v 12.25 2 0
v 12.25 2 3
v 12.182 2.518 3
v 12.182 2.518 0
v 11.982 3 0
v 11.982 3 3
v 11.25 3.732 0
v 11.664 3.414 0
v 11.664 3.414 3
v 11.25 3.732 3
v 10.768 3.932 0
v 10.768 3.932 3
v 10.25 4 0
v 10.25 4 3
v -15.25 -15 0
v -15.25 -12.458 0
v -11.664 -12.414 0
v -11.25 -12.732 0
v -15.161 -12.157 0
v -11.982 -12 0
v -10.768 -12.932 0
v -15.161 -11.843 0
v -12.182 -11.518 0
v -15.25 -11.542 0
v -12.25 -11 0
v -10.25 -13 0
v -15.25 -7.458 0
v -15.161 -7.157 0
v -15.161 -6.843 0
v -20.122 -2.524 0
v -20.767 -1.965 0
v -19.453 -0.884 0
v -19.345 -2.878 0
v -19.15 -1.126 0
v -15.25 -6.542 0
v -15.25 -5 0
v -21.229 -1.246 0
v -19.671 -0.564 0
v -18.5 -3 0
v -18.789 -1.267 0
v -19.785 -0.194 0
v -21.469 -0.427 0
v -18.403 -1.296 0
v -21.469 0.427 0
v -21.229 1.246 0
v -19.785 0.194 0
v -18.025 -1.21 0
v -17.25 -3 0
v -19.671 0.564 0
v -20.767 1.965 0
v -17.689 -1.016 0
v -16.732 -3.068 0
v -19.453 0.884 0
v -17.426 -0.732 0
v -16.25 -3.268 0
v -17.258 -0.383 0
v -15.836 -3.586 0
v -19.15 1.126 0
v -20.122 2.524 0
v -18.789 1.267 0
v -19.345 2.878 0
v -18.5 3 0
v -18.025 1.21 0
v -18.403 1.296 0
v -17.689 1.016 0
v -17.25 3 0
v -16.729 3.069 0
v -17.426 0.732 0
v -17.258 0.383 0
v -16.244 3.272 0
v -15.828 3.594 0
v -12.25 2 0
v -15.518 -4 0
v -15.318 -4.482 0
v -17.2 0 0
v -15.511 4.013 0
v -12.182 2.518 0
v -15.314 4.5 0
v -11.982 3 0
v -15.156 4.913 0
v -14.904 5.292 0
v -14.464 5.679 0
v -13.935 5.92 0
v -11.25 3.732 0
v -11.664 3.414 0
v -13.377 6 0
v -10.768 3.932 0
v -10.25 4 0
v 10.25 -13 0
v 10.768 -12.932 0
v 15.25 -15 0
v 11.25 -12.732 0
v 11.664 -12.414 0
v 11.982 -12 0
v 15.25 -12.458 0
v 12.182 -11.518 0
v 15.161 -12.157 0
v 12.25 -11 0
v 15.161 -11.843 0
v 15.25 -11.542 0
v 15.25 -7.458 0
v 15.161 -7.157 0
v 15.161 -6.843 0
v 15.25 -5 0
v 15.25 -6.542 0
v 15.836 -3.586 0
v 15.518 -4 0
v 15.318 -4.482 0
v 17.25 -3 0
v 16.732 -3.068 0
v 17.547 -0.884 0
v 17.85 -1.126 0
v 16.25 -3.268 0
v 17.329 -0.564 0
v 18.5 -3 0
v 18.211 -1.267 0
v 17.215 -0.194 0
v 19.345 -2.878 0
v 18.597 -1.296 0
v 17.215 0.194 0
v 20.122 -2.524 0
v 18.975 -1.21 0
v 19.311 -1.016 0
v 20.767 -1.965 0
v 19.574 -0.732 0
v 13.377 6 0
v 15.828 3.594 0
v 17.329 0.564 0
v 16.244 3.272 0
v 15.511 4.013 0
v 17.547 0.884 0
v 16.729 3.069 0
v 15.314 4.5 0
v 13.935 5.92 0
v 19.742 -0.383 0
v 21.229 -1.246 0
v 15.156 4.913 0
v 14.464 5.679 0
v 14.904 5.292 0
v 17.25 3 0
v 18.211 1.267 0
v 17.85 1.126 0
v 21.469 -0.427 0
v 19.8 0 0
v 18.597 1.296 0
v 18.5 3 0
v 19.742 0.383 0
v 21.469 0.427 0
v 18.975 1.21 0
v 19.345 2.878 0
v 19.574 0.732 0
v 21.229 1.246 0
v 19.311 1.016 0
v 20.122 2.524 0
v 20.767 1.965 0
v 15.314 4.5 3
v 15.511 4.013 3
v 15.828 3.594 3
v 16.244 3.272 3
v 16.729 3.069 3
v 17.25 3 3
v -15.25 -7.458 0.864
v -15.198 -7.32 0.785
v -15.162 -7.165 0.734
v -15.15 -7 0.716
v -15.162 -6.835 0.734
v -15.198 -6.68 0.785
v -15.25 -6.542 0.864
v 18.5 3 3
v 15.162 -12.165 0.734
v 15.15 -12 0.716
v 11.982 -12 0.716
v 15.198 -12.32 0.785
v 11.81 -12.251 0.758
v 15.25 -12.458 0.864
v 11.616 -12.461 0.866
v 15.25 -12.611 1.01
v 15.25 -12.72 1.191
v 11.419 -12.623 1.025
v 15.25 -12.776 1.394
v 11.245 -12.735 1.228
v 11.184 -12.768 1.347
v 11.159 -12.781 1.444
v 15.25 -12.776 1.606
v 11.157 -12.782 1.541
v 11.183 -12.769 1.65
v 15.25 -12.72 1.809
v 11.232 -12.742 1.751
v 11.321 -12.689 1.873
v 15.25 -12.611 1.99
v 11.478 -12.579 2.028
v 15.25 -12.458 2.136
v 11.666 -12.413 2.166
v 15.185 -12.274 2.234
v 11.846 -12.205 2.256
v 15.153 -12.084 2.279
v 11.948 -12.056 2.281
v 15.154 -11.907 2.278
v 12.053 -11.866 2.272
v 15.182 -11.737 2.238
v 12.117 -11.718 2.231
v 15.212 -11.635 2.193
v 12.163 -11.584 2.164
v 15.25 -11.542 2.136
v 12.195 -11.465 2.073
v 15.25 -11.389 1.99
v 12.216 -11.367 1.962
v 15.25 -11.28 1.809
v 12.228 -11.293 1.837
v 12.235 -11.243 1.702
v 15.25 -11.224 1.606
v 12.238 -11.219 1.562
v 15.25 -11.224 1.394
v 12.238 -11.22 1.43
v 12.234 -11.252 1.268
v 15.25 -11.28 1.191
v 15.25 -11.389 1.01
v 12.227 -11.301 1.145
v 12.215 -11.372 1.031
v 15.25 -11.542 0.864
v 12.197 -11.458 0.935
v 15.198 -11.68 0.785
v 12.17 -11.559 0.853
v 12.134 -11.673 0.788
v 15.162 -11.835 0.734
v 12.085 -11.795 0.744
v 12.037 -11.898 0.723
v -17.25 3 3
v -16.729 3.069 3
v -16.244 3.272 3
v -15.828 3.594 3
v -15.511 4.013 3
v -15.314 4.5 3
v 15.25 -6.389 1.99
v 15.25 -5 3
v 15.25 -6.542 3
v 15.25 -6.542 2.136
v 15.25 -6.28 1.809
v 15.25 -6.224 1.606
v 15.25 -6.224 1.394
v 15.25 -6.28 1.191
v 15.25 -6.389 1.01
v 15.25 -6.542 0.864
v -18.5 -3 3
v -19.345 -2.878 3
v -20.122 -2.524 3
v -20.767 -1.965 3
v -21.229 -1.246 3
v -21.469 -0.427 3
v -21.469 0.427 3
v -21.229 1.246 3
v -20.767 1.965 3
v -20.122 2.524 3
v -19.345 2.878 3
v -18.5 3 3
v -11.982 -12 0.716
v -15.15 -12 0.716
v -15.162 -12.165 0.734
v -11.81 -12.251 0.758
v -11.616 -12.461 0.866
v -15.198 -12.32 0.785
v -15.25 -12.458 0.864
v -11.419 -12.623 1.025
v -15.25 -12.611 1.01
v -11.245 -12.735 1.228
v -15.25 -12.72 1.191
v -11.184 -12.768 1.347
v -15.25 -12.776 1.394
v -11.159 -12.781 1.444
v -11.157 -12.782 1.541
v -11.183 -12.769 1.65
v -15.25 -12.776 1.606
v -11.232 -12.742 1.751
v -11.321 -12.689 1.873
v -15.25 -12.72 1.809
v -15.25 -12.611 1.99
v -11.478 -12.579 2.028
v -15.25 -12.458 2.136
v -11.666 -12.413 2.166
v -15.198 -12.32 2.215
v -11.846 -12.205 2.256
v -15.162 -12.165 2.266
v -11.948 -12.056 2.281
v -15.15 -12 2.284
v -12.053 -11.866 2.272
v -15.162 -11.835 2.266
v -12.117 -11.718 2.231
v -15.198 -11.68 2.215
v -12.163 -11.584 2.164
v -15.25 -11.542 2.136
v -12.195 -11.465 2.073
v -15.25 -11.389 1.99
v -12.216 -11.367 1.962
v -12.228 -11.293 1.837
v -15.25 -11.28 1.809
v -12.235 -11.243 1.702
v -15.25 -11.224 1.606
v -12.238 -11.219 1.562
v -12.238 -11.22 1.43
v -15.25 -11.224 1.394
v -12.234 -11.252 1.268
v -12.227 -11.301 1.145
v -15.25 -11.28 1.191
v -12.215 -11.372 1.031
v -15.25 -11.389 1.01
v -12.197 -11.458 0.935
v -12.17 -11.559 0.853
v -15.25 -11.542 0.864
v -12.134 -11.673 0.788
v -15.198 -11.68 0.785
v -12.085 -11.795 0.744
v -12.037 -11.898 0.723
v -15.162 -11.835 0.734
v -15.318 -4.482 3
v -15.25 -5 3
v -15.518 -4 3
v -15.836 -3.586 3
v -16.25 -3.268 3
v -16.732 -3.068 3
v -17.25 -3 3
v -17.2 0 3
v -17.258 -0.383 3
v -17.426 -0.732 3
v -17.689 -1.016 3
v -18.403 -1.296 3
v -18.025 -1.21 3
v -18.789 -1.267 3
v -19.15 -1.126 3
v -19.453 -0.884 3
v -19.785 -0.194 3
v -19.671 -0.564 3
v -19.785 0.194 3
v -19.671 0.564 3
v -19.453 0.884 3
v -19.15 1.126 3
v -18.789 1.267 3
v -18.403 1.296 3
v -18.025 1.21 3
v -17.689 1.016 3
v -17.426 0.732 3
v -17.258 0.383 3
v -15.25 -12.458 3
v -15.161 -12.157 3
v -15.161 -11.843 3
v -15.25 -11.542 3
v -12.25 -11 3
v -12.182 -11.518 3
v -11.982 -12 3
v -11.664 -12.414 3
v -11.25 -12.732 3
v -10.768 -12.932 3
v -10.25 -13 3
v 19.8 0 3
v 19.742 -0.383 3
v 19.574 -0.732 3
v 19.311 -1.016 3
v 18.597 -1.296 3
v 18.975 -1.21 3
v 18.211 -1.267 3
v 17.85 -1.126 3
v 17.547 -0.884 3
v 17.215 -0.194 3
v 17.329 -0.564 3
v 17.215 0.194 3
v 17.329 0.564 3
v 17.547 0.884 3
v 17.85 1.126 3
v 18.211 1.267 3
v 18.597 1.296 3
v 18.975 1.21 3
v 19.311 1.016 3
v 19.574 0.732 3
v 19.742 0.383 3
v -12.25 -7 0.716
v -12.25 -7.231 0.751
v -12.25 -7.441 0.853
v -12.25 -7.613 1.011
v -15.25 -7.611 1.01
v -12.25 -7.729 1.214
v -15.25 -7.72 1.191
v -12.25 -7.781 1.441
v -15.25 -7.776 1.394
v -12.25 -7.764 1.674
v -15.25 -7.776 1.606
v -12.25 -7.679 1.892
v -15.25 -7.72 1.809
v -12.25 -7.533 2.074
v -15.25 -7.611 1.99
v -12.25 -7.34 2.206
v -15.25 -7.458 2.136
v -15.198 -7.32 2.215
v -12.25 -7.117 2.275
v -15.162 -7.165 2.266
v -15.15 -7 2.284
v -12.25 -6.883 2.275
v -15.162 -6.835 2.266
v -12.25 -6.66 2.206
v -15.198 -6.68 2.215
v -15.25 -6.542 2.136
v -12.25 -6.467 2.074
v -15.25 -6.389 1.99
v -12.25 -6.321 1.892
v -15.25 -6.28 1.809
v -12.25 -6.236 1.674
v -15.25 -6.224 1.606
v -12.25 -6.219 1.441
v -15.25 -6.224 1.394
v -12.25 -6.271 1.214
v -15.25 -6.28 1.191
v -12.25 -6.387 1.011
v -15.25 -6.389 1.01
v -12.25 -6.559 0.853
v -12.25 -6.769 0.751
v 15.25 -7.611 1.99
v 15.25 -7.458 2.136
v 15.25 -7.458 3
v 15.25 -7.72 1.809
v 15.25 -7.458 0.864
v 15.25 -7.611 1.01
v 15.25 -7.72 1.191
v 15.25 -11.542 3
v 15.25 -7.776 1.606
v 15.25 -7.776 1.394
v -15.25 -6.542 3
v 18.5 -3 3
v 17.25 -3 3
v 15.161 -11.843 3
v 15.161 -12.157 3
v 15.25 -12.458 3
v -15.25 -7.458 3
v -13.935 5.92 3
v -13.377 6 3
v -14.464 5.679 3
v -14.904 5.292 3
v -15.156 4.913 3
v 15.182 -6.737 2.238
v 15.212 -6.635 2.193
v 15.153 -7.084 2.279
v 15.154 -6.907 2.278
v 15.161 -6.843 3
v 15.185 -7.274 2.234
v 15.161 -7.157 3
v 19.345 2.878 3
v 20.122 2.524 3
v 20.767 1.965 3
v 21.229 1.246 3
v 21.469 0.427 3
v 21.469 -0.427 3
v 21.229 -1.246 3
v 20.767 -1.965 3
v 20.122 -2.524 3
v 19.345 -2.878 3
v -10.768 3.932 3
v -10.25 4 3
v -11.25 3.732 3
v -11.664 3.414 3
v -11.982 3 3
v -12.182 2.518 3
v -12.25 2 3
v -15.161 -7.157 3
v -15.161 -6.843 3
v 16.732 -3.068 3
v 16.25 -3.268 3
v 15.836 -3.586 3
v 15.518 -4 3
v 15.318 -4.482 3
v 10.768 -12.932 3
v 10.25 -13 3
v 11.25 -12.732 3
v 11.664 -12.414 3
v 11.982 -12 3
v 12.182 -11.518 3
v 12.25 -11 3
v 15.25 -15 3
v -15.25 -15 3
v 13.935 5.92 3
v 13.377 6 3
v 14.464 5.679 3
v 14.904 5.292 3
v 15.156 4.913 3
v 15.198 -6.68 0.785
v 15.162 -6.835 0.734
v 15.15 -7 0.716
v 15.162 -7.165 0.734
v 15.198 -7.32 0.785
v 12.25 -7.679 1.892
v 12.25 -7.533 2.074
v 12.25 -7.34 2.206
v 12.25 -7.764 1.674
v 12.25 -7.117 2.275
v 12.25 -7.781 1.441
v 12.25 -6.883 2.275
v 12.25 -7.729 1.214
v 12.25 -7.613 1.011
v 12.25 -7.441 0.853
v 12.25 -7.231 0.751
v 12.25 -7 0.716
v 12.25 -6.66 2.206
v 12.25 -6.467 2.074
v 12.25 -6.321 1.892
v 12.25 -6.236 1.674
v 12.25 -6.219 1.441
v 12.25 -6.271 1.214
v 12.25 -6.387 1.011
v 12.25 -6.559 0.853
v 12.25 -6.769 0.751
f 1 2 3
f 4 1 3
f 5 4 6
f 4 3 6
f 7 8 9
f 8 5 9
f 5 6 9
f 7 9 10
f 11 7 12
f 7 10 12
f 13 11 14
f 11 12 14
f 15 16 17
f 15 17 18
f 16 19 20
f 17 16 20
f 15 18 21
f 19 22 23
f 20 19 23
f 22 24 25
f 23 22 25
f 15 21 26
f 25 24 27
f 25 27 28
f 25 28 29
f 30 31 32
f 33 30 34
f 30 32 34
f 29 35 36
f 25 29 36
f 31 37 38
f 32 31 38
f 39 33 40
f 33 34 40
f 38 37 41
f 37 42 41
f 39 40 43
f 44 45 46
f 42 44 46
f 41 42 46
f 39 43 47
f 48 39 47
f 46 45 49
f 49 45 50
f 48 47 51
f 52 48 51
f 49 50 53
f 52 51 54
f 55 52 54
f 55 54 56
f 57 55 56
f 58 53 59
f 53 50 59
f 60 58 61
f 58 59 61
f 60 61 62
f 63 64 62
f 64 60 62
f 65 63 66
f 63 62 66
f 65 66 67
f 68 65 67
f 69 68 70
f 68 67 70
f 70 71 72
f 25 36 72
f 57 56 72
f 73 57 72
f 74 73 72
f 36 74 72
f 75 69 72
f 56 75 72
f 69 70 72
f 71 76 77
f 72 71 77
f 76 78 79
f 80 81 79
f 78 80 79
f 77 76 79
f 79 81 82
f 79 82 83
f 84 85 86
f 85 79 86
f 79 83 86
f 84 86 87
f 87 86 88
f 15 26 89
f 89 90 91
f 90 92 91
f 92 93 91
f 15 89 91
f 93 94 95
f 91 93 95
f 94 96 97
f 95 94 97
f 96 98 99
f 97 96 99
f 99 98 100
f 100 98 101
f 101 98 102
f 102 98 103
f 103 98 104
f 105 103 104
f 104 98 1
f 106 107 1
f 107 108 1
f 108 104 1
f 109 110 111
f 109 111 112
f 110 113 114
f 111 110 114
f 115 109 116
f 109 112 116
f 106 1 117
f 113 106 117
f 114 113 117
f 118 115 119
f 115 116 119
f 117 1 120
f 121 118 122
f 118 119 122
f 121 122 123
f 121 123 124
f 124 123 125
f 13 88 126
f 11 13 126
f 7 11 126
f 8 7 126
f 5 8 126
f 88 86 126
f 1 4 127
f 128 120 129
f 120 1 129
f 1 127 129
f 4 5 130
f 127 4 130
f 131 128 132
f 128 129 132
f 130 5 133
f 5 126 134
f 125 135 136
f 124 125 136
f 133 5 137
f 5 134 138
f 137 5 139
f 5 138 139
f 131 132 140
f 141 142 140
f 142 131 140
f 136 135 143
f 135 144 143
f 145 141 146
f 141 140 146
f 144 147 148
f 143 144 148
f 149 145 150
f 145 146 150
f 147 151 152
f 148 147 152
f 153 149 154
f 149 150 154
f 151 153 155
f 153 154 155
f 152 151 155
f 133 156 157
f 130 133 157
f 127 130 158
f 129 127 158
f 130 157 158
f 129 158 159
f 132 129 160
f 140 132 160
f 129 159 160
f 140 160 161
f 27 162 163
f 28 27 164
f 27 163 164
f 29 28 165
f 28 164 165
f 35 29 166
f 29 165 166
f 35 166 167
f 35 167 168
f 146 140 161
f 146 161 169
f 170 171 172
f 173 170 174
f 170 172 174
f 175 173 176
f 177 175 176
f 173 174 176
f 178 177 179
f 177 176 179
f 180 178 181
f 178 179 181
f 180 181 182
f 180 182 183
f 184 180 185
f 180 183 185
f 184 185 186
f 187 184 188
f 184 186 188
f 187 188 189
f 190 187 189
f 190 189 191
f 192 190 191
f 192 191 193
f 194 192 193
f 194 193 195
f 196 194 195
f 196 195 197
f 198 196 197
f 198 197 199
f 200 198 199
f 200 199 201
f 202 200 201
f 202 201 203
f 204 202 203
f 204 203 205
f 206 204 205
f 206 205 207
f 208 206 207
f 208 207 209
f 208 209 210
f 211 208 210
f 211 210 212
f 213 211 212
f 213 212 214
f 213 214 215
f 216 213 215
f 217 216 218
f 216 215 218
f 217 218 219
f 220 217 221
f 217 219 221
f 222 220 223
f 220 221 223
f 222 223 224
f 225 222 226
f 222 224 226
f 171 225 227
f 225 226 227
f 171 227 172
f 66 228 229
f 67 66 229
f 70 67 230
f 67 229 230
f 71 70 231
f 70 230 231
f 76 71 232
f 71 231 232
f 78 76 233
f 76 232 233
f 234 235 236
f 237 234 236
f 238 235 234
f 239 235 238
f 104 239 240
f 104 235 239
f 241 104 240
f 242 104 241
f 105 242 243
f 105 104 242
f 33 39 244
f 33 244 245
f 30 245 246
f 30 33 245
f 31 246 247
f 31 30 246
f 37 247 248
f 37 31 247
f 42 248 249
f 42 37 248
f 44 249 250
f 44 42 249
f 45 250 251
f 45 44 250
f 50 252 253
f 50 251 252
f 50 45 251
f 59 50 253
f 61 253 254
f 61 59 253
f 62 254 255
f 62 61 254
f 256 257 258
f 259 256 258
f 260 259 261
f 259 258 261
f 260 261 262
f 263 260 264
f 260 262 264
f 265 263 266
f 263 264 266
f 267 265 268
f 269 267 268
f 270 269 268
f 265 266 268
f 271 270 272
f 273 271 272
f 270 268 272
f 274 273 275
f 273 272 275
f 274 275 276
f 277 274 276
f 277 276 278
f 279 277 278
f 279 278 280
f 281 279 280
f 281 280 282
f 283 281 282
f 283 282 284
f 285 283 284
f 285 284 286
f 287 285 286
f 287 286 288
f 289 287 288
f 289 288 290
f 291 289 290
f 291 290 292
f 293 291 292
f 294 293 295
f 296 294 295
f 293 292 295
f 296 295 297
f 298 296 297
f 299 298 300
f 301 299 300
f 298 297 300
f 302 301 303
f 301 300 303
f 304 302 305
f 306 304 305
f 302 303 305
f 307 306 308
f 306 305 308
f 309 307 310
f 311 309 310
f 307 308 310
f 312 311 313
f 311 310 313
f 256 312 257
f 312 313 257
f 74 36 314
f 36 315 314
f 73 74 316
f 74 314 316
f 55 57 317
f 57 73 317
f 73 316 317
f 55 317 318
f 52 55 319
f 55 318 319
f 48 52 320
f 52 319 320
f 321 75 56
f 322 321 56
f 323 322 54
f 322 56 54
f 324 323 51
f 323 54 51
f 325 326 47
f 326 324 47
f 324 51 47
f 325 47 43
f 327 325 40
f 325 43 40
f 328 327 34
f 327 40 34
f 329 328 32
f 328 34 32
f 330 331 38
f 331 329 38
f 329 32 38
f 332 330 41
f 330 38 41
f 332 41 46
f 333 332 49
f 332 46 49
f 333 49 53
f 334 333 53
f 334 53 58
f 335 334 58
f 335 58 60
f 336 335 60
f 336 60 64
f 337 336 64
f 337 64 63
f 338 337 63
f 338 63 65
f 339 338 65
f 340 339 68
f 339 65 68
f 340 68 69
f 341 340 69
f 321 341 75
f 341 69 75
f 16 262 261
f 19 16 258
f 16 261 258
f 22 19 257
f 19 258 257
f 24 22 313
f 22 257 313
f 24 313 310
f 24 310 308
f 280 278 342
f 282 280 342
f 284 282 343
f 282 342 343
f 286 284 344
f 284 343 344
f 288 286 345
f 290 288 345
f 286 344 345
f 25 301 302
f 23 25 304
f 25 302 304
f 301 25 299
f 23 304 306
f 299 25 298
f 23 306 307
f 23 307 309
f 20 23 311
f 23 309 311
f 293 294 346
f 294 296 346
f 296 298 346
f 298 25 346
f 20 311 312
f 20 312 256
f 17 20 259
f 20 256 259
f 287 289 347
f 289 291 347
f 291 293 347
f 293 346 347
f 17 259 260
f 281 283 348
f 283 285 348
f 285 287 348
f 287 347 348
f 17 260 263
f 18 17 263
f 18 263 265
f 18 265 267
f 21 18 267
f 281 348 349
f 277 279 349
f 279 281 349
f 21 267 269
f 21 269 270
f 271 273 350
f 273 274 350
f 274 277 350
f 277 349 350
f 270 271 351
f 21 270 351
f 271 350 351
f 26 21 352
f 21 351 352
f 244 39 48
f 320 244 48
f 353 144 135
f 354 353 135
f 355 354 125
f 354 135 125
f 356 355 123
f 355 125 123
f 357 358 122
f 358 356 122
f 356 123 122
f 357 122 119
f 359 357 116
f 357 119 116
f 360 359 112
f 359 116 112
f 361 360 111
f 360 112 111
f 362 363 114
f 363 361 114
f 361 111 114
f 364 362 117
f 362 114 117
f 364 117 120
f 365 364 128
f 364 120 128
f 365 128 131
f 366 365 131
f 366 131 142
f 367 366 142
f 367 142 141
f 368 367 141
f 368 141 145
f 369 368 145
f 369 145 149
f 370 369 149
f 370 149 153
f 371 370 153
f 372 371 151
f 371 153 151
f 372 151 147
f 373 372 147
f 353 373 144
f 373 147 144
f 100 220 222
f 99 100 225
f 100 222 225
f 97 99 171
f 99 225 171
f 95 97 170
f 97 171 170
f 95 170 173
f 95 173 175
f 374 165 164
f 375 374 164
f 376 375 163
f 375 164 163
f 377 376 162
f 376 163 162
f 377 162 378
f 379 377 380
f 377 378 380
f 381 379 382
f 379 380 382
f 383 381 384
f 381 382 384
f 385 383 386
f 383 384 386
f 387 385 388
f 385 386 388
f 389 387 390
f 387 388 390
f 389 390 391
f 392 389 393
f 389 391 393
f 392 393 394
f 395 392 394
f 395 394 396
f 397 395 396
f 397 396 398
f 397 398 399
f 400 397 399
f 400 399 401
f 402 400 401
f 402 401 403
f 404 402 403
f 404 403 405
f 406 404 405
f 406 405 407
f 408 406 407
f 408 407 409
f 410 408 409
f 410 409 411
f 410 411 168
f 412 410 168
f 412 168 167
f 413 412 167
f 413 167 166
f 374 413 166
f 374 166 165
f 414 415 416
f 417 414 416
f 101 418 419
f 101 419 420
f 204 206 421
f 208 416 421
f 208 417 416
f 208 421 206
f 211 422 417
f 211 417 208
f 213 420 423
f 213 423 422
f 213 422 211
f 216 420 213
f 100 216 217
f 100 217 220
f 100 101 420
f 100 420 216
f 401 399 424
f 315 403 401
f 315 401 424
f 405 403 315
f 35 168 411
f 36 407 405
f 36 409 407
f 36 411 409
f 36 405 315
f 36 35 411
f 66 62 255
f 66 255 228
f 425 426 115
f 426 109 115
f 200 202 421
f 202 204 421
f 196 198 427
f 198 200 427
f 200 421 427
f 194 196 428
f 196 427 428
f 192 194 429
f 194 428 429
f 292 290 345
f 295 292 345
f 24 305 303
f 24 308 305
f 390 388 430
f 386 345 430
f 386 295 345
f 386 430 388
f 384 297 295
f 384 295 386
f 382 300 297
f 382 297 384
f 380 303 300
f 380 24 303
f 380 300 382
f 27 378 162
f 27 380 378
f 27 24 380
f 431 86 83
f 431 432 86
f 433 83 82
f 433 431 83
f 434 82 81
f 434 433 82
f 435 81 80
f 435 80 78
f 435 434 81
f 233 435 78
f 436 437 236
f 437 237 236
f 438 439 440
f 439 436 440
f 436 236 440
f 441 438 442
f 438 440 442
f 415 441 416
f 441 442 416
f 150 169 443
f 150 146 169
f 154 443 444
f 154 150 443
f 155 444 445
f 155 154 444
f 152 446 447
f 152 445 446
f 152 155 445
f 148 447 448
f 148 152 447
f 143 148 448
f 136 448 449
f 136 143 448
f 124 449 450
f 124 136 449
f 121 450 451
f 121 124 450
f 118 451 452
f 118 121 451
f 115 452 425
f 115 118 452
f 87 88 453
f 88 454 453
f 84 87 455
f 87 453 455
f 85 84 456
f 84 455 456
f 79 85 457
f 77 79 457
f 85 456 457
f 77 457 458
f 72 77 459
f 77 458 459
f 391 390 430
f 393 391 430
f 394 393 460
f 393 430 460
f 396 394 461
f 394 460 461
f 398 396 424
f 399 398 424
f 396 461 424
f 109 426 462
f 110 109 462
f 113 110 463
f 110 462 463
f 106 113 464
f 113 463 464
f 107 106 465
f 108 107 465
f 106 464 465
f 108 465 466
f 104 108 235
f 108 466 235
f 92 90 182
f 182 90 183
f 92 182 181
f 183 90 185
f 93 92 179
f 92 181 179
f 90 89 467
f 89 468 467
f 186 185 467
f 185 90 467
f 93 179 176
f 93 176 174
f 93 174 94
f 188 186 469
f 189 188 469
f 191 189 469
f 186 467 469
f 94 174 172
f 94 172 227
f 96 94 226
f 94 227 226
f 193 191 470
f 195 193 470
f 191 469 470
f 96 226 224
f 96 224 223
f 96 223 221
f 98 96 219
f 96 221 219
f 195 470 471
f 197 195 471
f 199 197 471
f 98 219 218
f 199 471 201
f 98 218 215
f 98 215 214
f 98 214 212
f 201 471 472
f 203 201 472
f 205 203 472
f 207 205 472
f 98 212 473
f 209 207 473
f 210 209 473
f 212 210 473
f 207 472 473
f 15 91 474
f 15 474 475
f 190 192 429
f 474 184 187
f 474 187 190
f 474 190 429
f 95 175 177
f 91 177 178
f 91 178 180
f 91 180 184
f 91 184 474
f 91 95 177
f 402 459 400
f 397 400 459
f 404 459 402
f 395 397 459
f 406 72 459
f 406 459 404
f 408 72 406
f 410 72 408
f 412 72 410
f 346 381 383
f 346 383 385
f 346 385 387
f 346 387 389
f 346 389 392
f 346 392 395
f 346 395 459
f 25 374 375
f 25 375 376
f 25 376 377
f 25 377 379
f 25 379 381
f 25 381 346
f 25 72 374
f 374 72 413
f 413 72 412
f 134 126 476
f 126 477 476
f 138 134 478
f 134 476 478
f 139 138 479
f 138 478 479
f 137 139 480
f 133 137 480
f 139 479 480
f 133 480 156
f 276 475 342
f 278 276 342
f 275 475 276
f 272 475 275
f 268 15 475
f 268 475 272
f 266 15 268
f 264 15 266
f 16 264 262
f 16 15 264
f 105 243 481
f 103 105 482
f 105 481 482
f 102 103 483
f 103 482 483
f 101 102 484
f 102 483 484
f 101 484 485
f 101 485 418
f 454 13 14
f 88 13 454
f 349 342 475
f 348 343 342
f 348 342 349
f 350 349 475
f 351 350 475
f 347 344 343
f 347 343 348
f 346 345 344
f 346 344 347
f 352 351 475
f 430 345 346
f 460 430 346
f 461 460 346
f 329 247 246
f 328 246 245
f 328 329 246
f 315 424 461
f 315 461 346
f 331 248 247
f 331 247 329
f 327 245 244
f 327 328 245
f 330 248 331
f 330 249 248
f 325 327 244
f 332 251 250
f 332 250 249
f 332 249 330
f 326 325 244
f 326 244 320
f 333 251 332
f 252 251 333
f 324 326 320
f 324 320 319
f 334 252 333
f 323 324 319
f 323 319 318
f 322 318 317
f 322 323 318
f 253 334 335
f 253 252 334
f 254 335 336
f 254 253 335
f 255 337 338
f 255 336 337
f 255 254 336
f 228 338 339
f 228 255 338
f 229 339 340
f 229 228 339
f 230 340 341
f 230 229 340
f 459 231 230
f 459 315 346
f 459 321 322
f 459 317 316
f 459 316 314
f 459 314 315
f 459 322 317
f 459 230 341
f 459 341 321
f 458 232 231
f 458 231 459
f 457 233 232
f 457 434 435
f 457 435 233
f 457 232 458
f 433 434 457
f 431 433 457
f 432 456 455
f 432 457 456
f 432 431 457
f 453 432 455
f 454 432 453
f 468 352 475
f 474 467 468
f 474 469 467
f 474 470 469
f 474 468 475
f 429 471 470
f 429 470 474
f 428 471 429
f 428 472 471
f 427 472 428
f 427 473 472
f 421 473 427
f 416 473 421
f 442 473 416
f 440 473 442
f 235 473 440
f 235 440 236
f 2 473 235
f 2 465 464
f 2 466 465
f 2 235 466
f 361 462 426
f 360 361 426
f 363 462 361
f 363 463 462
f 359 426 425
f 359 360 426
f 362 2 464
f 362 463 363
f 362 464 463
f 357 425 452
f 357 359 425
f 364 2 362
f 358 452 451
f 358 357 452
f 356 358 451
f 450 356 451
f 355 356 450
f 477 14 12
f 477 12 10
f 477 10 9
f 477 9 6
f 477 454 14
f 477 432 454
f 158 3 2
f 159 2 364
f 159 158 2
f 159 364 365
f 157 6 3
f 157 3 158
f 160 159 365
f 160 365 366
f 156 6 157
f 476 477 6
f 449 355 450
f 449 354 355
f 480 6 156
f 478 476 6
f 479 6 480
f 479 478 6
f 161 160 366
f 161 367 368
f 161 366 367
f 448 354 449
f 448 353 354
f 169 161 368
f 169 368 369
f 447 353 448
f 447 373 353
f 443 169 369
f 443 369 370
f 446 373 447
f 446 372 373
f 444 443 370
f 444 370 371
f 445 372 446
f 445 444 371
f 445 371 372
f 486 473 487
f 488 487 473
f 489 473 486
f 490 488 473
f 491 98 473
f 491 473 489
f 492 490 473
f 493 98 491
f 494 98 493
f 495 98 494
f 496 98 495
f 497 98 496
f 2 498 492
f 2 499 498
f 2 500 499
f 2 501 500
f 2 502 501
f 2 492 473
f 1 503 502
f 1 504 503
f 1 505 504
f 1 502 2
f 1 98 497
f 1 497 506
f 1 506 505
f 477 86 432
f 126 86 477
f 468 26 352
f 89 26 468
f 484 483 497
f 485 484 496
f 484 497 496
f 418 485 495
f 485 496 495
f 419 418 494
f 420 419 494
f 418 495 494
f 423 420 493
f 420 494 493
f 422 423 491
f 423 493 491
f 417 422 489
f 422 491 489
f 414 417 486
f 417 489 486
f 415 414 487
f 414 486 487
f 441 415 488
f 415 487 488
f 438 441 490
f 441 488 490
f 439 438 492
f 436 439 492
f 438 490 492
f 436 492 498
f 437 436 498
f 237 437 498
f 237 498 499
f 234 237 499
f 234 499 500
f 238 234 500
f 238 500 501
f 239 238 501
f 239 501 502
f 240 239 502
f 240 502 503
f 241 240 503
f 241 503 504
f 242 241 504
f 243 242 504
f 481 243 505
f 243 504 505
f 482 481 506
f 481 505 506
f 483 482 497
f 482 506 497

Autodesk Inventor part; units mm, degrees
ref_plane "YZ Plane" through (0, 0, 0) normal (1, 0, 0) x (0, 1, 0)
ref_plane "XZ Plane" through (0, 0, 0) normal (0, 1, 0) x (-1, 0, 0)
ref_plane "XY Plane" through (0, 0, 0) normal (0, 0, 1) x (1, 0, 0)
sketch "スケッチ1" plane through (0, 0, 0) normal (0, 0, 1) x (1, 0, 0)
  line L0 (0, 0) -> (0, 2.6709) construction
  circle A0 centre (-18.5, 0) radius 1.3
  circle A1 centre (18.5, 0) radius 1.3
  circle A2 centre (-18.5, 0) radius 3
  circle A3 centre (18.5, 0) radius 3
  line L1 (-18.5, 3) -> (18.5, 3)
  line L2 (-18.5, -3) -> (18.5, -3)
  line L3 (-15.25, 6) -> (15.25, 6)
  line L4 (15.25, 6) -> (15.25, -15)
  line L5 (15.25, -15) -> (-15.25, -15)
  line L6 (-15.25, -15) -> (-15.25, 6)
  point P0 (-18.5, 3)
  point P1 (15.25, -3)
  point P2 (-15.25, -3)
  point P3 (-15.25, 3)
  point P4 (15.25, 3)
  point P5 (0, 6)
  point P6 (0, 3)
  dimension "d0" = 2.6
  dimension "d1" = 18.5
  dimension "d2" = 6
  dimension "d3" = 6
  dimension "d6" = 3
  dimension "d7" = 12
  dimension "d9" = 30.5
extrude "押し出し1" add sketch "スケッチ1" along normal blind 3
fillet "フィレット1" radius 2 6 edges at (-15.25, 3, 1.5) (-15.25, -3, 1.5) (15.25, 3, 1.5) (15.25, -3, 1.5) (-15.25, 6, 1.5) (15.25, 6, 1.5)
sketch "スケッチ4" plane through (0, 0, 0) normal (0, 0, -1) x (-1, 0, 0)
  line L0 (-12.25, 4) -> (12.25, 4)
  line L1 (12.25, 4) -> (12.25, -13)
  line L2 (12.25, -13) -> (-12.25, -13)
  line L3 (-12.25, -13) -> (-12.25, 4)
  line L4 (15.25, -15) -> (-15.25, -15) projected
  line L5 (-13.377, 6) -> (13.377, 6) projected
  line L6 (-15.25, -15) -> (-15.25, -5) projected
  line L7 (15.25, -5) -> (15.25, -15) projected
  point P0 (0, 0)
  dimension "d27" = 2
  dimension "d28" = 2
  dimension "d32" = 3
  dimension "d33" = 3
extrude "押し出し3" cut sketch "スケッチ4" against normal through all
fillet "フィレット2" radius 2 4 edges at (12.25, 4, 1.5) (-12.25, 4, 1.5) (12.25, -13, 1.5) (-12.25, -13, 1.5)
sketch "スケッチ2" plane through (15.25, -15, 3) normal (1, 0, 0) x (0, 0, -1)
  line L0 (3, 0) -> (0, 0) projected
  point P0 (3, 15)
  point P1 (1.5, 3)
  point P2 (1.5, 8)
  point P3 (1.5, 0)
  dimension "d10" = 3
  dimension "d11" = 5
hole "穴1" at (15.25, -12, 1.5) at (15.25, -7, 1.5) direction (-1, 0, 0) diameter 1.567 end through all thread size "M2x0.4" class "6H" standard "ISO Metric profile"
sketch "スケッチ3" plane through (0, 0, 3) normal (0, 0, 1) x (1, 0, 0)
  line L0 (-15.25, -12.7835) -> (-15.25, -11.2165) construction
  line L1 (-15.25, -7.7835) -> (-15.25, -6.2165) construction
  line L2 (15.25, -11.2165) -> (15.25, -12.7835) construction
  line L3 (15.25, -6.2165) -> (15.25, -7.7835) construction
  circle A0 centre (-16.25, -12) radius 1.1
  circle A1 centre (-16.25, -7) radius 1.1
  line L4 (-15.25, -15) -> (15.25, -15) construction
  line L5 (0, -15) -> (0, 6) construction
  line L6 (13.377, 6) -> (-13.377, 6) construction
  line L7 (15.25, -12.7835) -> (15.25, -11.2165) construction
  line L8 (15.25, -7.7835) -> (15.25, -6.2165) construction
  circle A2 centre (16.25, -12) radius 1.1
  circle A3 centre (16.25, -7) radius 1.1
  point P0 (0, 0)
  point P1 (-15.25, -12)
  point P2 (-15.25, -7)
  point P3 (15.25, -12)
  point P4 (15.25, -7)
  dimension "d19" = 2.2
  dimension "d20" = 2.2
  dimension "d21" = 1
  dimension "d22" = 1
extrude "押し出し2" cut sketch "スケッチ3" against normal through all
properties part number "ude_sensor" material "アルミニウム 2014-T4"
